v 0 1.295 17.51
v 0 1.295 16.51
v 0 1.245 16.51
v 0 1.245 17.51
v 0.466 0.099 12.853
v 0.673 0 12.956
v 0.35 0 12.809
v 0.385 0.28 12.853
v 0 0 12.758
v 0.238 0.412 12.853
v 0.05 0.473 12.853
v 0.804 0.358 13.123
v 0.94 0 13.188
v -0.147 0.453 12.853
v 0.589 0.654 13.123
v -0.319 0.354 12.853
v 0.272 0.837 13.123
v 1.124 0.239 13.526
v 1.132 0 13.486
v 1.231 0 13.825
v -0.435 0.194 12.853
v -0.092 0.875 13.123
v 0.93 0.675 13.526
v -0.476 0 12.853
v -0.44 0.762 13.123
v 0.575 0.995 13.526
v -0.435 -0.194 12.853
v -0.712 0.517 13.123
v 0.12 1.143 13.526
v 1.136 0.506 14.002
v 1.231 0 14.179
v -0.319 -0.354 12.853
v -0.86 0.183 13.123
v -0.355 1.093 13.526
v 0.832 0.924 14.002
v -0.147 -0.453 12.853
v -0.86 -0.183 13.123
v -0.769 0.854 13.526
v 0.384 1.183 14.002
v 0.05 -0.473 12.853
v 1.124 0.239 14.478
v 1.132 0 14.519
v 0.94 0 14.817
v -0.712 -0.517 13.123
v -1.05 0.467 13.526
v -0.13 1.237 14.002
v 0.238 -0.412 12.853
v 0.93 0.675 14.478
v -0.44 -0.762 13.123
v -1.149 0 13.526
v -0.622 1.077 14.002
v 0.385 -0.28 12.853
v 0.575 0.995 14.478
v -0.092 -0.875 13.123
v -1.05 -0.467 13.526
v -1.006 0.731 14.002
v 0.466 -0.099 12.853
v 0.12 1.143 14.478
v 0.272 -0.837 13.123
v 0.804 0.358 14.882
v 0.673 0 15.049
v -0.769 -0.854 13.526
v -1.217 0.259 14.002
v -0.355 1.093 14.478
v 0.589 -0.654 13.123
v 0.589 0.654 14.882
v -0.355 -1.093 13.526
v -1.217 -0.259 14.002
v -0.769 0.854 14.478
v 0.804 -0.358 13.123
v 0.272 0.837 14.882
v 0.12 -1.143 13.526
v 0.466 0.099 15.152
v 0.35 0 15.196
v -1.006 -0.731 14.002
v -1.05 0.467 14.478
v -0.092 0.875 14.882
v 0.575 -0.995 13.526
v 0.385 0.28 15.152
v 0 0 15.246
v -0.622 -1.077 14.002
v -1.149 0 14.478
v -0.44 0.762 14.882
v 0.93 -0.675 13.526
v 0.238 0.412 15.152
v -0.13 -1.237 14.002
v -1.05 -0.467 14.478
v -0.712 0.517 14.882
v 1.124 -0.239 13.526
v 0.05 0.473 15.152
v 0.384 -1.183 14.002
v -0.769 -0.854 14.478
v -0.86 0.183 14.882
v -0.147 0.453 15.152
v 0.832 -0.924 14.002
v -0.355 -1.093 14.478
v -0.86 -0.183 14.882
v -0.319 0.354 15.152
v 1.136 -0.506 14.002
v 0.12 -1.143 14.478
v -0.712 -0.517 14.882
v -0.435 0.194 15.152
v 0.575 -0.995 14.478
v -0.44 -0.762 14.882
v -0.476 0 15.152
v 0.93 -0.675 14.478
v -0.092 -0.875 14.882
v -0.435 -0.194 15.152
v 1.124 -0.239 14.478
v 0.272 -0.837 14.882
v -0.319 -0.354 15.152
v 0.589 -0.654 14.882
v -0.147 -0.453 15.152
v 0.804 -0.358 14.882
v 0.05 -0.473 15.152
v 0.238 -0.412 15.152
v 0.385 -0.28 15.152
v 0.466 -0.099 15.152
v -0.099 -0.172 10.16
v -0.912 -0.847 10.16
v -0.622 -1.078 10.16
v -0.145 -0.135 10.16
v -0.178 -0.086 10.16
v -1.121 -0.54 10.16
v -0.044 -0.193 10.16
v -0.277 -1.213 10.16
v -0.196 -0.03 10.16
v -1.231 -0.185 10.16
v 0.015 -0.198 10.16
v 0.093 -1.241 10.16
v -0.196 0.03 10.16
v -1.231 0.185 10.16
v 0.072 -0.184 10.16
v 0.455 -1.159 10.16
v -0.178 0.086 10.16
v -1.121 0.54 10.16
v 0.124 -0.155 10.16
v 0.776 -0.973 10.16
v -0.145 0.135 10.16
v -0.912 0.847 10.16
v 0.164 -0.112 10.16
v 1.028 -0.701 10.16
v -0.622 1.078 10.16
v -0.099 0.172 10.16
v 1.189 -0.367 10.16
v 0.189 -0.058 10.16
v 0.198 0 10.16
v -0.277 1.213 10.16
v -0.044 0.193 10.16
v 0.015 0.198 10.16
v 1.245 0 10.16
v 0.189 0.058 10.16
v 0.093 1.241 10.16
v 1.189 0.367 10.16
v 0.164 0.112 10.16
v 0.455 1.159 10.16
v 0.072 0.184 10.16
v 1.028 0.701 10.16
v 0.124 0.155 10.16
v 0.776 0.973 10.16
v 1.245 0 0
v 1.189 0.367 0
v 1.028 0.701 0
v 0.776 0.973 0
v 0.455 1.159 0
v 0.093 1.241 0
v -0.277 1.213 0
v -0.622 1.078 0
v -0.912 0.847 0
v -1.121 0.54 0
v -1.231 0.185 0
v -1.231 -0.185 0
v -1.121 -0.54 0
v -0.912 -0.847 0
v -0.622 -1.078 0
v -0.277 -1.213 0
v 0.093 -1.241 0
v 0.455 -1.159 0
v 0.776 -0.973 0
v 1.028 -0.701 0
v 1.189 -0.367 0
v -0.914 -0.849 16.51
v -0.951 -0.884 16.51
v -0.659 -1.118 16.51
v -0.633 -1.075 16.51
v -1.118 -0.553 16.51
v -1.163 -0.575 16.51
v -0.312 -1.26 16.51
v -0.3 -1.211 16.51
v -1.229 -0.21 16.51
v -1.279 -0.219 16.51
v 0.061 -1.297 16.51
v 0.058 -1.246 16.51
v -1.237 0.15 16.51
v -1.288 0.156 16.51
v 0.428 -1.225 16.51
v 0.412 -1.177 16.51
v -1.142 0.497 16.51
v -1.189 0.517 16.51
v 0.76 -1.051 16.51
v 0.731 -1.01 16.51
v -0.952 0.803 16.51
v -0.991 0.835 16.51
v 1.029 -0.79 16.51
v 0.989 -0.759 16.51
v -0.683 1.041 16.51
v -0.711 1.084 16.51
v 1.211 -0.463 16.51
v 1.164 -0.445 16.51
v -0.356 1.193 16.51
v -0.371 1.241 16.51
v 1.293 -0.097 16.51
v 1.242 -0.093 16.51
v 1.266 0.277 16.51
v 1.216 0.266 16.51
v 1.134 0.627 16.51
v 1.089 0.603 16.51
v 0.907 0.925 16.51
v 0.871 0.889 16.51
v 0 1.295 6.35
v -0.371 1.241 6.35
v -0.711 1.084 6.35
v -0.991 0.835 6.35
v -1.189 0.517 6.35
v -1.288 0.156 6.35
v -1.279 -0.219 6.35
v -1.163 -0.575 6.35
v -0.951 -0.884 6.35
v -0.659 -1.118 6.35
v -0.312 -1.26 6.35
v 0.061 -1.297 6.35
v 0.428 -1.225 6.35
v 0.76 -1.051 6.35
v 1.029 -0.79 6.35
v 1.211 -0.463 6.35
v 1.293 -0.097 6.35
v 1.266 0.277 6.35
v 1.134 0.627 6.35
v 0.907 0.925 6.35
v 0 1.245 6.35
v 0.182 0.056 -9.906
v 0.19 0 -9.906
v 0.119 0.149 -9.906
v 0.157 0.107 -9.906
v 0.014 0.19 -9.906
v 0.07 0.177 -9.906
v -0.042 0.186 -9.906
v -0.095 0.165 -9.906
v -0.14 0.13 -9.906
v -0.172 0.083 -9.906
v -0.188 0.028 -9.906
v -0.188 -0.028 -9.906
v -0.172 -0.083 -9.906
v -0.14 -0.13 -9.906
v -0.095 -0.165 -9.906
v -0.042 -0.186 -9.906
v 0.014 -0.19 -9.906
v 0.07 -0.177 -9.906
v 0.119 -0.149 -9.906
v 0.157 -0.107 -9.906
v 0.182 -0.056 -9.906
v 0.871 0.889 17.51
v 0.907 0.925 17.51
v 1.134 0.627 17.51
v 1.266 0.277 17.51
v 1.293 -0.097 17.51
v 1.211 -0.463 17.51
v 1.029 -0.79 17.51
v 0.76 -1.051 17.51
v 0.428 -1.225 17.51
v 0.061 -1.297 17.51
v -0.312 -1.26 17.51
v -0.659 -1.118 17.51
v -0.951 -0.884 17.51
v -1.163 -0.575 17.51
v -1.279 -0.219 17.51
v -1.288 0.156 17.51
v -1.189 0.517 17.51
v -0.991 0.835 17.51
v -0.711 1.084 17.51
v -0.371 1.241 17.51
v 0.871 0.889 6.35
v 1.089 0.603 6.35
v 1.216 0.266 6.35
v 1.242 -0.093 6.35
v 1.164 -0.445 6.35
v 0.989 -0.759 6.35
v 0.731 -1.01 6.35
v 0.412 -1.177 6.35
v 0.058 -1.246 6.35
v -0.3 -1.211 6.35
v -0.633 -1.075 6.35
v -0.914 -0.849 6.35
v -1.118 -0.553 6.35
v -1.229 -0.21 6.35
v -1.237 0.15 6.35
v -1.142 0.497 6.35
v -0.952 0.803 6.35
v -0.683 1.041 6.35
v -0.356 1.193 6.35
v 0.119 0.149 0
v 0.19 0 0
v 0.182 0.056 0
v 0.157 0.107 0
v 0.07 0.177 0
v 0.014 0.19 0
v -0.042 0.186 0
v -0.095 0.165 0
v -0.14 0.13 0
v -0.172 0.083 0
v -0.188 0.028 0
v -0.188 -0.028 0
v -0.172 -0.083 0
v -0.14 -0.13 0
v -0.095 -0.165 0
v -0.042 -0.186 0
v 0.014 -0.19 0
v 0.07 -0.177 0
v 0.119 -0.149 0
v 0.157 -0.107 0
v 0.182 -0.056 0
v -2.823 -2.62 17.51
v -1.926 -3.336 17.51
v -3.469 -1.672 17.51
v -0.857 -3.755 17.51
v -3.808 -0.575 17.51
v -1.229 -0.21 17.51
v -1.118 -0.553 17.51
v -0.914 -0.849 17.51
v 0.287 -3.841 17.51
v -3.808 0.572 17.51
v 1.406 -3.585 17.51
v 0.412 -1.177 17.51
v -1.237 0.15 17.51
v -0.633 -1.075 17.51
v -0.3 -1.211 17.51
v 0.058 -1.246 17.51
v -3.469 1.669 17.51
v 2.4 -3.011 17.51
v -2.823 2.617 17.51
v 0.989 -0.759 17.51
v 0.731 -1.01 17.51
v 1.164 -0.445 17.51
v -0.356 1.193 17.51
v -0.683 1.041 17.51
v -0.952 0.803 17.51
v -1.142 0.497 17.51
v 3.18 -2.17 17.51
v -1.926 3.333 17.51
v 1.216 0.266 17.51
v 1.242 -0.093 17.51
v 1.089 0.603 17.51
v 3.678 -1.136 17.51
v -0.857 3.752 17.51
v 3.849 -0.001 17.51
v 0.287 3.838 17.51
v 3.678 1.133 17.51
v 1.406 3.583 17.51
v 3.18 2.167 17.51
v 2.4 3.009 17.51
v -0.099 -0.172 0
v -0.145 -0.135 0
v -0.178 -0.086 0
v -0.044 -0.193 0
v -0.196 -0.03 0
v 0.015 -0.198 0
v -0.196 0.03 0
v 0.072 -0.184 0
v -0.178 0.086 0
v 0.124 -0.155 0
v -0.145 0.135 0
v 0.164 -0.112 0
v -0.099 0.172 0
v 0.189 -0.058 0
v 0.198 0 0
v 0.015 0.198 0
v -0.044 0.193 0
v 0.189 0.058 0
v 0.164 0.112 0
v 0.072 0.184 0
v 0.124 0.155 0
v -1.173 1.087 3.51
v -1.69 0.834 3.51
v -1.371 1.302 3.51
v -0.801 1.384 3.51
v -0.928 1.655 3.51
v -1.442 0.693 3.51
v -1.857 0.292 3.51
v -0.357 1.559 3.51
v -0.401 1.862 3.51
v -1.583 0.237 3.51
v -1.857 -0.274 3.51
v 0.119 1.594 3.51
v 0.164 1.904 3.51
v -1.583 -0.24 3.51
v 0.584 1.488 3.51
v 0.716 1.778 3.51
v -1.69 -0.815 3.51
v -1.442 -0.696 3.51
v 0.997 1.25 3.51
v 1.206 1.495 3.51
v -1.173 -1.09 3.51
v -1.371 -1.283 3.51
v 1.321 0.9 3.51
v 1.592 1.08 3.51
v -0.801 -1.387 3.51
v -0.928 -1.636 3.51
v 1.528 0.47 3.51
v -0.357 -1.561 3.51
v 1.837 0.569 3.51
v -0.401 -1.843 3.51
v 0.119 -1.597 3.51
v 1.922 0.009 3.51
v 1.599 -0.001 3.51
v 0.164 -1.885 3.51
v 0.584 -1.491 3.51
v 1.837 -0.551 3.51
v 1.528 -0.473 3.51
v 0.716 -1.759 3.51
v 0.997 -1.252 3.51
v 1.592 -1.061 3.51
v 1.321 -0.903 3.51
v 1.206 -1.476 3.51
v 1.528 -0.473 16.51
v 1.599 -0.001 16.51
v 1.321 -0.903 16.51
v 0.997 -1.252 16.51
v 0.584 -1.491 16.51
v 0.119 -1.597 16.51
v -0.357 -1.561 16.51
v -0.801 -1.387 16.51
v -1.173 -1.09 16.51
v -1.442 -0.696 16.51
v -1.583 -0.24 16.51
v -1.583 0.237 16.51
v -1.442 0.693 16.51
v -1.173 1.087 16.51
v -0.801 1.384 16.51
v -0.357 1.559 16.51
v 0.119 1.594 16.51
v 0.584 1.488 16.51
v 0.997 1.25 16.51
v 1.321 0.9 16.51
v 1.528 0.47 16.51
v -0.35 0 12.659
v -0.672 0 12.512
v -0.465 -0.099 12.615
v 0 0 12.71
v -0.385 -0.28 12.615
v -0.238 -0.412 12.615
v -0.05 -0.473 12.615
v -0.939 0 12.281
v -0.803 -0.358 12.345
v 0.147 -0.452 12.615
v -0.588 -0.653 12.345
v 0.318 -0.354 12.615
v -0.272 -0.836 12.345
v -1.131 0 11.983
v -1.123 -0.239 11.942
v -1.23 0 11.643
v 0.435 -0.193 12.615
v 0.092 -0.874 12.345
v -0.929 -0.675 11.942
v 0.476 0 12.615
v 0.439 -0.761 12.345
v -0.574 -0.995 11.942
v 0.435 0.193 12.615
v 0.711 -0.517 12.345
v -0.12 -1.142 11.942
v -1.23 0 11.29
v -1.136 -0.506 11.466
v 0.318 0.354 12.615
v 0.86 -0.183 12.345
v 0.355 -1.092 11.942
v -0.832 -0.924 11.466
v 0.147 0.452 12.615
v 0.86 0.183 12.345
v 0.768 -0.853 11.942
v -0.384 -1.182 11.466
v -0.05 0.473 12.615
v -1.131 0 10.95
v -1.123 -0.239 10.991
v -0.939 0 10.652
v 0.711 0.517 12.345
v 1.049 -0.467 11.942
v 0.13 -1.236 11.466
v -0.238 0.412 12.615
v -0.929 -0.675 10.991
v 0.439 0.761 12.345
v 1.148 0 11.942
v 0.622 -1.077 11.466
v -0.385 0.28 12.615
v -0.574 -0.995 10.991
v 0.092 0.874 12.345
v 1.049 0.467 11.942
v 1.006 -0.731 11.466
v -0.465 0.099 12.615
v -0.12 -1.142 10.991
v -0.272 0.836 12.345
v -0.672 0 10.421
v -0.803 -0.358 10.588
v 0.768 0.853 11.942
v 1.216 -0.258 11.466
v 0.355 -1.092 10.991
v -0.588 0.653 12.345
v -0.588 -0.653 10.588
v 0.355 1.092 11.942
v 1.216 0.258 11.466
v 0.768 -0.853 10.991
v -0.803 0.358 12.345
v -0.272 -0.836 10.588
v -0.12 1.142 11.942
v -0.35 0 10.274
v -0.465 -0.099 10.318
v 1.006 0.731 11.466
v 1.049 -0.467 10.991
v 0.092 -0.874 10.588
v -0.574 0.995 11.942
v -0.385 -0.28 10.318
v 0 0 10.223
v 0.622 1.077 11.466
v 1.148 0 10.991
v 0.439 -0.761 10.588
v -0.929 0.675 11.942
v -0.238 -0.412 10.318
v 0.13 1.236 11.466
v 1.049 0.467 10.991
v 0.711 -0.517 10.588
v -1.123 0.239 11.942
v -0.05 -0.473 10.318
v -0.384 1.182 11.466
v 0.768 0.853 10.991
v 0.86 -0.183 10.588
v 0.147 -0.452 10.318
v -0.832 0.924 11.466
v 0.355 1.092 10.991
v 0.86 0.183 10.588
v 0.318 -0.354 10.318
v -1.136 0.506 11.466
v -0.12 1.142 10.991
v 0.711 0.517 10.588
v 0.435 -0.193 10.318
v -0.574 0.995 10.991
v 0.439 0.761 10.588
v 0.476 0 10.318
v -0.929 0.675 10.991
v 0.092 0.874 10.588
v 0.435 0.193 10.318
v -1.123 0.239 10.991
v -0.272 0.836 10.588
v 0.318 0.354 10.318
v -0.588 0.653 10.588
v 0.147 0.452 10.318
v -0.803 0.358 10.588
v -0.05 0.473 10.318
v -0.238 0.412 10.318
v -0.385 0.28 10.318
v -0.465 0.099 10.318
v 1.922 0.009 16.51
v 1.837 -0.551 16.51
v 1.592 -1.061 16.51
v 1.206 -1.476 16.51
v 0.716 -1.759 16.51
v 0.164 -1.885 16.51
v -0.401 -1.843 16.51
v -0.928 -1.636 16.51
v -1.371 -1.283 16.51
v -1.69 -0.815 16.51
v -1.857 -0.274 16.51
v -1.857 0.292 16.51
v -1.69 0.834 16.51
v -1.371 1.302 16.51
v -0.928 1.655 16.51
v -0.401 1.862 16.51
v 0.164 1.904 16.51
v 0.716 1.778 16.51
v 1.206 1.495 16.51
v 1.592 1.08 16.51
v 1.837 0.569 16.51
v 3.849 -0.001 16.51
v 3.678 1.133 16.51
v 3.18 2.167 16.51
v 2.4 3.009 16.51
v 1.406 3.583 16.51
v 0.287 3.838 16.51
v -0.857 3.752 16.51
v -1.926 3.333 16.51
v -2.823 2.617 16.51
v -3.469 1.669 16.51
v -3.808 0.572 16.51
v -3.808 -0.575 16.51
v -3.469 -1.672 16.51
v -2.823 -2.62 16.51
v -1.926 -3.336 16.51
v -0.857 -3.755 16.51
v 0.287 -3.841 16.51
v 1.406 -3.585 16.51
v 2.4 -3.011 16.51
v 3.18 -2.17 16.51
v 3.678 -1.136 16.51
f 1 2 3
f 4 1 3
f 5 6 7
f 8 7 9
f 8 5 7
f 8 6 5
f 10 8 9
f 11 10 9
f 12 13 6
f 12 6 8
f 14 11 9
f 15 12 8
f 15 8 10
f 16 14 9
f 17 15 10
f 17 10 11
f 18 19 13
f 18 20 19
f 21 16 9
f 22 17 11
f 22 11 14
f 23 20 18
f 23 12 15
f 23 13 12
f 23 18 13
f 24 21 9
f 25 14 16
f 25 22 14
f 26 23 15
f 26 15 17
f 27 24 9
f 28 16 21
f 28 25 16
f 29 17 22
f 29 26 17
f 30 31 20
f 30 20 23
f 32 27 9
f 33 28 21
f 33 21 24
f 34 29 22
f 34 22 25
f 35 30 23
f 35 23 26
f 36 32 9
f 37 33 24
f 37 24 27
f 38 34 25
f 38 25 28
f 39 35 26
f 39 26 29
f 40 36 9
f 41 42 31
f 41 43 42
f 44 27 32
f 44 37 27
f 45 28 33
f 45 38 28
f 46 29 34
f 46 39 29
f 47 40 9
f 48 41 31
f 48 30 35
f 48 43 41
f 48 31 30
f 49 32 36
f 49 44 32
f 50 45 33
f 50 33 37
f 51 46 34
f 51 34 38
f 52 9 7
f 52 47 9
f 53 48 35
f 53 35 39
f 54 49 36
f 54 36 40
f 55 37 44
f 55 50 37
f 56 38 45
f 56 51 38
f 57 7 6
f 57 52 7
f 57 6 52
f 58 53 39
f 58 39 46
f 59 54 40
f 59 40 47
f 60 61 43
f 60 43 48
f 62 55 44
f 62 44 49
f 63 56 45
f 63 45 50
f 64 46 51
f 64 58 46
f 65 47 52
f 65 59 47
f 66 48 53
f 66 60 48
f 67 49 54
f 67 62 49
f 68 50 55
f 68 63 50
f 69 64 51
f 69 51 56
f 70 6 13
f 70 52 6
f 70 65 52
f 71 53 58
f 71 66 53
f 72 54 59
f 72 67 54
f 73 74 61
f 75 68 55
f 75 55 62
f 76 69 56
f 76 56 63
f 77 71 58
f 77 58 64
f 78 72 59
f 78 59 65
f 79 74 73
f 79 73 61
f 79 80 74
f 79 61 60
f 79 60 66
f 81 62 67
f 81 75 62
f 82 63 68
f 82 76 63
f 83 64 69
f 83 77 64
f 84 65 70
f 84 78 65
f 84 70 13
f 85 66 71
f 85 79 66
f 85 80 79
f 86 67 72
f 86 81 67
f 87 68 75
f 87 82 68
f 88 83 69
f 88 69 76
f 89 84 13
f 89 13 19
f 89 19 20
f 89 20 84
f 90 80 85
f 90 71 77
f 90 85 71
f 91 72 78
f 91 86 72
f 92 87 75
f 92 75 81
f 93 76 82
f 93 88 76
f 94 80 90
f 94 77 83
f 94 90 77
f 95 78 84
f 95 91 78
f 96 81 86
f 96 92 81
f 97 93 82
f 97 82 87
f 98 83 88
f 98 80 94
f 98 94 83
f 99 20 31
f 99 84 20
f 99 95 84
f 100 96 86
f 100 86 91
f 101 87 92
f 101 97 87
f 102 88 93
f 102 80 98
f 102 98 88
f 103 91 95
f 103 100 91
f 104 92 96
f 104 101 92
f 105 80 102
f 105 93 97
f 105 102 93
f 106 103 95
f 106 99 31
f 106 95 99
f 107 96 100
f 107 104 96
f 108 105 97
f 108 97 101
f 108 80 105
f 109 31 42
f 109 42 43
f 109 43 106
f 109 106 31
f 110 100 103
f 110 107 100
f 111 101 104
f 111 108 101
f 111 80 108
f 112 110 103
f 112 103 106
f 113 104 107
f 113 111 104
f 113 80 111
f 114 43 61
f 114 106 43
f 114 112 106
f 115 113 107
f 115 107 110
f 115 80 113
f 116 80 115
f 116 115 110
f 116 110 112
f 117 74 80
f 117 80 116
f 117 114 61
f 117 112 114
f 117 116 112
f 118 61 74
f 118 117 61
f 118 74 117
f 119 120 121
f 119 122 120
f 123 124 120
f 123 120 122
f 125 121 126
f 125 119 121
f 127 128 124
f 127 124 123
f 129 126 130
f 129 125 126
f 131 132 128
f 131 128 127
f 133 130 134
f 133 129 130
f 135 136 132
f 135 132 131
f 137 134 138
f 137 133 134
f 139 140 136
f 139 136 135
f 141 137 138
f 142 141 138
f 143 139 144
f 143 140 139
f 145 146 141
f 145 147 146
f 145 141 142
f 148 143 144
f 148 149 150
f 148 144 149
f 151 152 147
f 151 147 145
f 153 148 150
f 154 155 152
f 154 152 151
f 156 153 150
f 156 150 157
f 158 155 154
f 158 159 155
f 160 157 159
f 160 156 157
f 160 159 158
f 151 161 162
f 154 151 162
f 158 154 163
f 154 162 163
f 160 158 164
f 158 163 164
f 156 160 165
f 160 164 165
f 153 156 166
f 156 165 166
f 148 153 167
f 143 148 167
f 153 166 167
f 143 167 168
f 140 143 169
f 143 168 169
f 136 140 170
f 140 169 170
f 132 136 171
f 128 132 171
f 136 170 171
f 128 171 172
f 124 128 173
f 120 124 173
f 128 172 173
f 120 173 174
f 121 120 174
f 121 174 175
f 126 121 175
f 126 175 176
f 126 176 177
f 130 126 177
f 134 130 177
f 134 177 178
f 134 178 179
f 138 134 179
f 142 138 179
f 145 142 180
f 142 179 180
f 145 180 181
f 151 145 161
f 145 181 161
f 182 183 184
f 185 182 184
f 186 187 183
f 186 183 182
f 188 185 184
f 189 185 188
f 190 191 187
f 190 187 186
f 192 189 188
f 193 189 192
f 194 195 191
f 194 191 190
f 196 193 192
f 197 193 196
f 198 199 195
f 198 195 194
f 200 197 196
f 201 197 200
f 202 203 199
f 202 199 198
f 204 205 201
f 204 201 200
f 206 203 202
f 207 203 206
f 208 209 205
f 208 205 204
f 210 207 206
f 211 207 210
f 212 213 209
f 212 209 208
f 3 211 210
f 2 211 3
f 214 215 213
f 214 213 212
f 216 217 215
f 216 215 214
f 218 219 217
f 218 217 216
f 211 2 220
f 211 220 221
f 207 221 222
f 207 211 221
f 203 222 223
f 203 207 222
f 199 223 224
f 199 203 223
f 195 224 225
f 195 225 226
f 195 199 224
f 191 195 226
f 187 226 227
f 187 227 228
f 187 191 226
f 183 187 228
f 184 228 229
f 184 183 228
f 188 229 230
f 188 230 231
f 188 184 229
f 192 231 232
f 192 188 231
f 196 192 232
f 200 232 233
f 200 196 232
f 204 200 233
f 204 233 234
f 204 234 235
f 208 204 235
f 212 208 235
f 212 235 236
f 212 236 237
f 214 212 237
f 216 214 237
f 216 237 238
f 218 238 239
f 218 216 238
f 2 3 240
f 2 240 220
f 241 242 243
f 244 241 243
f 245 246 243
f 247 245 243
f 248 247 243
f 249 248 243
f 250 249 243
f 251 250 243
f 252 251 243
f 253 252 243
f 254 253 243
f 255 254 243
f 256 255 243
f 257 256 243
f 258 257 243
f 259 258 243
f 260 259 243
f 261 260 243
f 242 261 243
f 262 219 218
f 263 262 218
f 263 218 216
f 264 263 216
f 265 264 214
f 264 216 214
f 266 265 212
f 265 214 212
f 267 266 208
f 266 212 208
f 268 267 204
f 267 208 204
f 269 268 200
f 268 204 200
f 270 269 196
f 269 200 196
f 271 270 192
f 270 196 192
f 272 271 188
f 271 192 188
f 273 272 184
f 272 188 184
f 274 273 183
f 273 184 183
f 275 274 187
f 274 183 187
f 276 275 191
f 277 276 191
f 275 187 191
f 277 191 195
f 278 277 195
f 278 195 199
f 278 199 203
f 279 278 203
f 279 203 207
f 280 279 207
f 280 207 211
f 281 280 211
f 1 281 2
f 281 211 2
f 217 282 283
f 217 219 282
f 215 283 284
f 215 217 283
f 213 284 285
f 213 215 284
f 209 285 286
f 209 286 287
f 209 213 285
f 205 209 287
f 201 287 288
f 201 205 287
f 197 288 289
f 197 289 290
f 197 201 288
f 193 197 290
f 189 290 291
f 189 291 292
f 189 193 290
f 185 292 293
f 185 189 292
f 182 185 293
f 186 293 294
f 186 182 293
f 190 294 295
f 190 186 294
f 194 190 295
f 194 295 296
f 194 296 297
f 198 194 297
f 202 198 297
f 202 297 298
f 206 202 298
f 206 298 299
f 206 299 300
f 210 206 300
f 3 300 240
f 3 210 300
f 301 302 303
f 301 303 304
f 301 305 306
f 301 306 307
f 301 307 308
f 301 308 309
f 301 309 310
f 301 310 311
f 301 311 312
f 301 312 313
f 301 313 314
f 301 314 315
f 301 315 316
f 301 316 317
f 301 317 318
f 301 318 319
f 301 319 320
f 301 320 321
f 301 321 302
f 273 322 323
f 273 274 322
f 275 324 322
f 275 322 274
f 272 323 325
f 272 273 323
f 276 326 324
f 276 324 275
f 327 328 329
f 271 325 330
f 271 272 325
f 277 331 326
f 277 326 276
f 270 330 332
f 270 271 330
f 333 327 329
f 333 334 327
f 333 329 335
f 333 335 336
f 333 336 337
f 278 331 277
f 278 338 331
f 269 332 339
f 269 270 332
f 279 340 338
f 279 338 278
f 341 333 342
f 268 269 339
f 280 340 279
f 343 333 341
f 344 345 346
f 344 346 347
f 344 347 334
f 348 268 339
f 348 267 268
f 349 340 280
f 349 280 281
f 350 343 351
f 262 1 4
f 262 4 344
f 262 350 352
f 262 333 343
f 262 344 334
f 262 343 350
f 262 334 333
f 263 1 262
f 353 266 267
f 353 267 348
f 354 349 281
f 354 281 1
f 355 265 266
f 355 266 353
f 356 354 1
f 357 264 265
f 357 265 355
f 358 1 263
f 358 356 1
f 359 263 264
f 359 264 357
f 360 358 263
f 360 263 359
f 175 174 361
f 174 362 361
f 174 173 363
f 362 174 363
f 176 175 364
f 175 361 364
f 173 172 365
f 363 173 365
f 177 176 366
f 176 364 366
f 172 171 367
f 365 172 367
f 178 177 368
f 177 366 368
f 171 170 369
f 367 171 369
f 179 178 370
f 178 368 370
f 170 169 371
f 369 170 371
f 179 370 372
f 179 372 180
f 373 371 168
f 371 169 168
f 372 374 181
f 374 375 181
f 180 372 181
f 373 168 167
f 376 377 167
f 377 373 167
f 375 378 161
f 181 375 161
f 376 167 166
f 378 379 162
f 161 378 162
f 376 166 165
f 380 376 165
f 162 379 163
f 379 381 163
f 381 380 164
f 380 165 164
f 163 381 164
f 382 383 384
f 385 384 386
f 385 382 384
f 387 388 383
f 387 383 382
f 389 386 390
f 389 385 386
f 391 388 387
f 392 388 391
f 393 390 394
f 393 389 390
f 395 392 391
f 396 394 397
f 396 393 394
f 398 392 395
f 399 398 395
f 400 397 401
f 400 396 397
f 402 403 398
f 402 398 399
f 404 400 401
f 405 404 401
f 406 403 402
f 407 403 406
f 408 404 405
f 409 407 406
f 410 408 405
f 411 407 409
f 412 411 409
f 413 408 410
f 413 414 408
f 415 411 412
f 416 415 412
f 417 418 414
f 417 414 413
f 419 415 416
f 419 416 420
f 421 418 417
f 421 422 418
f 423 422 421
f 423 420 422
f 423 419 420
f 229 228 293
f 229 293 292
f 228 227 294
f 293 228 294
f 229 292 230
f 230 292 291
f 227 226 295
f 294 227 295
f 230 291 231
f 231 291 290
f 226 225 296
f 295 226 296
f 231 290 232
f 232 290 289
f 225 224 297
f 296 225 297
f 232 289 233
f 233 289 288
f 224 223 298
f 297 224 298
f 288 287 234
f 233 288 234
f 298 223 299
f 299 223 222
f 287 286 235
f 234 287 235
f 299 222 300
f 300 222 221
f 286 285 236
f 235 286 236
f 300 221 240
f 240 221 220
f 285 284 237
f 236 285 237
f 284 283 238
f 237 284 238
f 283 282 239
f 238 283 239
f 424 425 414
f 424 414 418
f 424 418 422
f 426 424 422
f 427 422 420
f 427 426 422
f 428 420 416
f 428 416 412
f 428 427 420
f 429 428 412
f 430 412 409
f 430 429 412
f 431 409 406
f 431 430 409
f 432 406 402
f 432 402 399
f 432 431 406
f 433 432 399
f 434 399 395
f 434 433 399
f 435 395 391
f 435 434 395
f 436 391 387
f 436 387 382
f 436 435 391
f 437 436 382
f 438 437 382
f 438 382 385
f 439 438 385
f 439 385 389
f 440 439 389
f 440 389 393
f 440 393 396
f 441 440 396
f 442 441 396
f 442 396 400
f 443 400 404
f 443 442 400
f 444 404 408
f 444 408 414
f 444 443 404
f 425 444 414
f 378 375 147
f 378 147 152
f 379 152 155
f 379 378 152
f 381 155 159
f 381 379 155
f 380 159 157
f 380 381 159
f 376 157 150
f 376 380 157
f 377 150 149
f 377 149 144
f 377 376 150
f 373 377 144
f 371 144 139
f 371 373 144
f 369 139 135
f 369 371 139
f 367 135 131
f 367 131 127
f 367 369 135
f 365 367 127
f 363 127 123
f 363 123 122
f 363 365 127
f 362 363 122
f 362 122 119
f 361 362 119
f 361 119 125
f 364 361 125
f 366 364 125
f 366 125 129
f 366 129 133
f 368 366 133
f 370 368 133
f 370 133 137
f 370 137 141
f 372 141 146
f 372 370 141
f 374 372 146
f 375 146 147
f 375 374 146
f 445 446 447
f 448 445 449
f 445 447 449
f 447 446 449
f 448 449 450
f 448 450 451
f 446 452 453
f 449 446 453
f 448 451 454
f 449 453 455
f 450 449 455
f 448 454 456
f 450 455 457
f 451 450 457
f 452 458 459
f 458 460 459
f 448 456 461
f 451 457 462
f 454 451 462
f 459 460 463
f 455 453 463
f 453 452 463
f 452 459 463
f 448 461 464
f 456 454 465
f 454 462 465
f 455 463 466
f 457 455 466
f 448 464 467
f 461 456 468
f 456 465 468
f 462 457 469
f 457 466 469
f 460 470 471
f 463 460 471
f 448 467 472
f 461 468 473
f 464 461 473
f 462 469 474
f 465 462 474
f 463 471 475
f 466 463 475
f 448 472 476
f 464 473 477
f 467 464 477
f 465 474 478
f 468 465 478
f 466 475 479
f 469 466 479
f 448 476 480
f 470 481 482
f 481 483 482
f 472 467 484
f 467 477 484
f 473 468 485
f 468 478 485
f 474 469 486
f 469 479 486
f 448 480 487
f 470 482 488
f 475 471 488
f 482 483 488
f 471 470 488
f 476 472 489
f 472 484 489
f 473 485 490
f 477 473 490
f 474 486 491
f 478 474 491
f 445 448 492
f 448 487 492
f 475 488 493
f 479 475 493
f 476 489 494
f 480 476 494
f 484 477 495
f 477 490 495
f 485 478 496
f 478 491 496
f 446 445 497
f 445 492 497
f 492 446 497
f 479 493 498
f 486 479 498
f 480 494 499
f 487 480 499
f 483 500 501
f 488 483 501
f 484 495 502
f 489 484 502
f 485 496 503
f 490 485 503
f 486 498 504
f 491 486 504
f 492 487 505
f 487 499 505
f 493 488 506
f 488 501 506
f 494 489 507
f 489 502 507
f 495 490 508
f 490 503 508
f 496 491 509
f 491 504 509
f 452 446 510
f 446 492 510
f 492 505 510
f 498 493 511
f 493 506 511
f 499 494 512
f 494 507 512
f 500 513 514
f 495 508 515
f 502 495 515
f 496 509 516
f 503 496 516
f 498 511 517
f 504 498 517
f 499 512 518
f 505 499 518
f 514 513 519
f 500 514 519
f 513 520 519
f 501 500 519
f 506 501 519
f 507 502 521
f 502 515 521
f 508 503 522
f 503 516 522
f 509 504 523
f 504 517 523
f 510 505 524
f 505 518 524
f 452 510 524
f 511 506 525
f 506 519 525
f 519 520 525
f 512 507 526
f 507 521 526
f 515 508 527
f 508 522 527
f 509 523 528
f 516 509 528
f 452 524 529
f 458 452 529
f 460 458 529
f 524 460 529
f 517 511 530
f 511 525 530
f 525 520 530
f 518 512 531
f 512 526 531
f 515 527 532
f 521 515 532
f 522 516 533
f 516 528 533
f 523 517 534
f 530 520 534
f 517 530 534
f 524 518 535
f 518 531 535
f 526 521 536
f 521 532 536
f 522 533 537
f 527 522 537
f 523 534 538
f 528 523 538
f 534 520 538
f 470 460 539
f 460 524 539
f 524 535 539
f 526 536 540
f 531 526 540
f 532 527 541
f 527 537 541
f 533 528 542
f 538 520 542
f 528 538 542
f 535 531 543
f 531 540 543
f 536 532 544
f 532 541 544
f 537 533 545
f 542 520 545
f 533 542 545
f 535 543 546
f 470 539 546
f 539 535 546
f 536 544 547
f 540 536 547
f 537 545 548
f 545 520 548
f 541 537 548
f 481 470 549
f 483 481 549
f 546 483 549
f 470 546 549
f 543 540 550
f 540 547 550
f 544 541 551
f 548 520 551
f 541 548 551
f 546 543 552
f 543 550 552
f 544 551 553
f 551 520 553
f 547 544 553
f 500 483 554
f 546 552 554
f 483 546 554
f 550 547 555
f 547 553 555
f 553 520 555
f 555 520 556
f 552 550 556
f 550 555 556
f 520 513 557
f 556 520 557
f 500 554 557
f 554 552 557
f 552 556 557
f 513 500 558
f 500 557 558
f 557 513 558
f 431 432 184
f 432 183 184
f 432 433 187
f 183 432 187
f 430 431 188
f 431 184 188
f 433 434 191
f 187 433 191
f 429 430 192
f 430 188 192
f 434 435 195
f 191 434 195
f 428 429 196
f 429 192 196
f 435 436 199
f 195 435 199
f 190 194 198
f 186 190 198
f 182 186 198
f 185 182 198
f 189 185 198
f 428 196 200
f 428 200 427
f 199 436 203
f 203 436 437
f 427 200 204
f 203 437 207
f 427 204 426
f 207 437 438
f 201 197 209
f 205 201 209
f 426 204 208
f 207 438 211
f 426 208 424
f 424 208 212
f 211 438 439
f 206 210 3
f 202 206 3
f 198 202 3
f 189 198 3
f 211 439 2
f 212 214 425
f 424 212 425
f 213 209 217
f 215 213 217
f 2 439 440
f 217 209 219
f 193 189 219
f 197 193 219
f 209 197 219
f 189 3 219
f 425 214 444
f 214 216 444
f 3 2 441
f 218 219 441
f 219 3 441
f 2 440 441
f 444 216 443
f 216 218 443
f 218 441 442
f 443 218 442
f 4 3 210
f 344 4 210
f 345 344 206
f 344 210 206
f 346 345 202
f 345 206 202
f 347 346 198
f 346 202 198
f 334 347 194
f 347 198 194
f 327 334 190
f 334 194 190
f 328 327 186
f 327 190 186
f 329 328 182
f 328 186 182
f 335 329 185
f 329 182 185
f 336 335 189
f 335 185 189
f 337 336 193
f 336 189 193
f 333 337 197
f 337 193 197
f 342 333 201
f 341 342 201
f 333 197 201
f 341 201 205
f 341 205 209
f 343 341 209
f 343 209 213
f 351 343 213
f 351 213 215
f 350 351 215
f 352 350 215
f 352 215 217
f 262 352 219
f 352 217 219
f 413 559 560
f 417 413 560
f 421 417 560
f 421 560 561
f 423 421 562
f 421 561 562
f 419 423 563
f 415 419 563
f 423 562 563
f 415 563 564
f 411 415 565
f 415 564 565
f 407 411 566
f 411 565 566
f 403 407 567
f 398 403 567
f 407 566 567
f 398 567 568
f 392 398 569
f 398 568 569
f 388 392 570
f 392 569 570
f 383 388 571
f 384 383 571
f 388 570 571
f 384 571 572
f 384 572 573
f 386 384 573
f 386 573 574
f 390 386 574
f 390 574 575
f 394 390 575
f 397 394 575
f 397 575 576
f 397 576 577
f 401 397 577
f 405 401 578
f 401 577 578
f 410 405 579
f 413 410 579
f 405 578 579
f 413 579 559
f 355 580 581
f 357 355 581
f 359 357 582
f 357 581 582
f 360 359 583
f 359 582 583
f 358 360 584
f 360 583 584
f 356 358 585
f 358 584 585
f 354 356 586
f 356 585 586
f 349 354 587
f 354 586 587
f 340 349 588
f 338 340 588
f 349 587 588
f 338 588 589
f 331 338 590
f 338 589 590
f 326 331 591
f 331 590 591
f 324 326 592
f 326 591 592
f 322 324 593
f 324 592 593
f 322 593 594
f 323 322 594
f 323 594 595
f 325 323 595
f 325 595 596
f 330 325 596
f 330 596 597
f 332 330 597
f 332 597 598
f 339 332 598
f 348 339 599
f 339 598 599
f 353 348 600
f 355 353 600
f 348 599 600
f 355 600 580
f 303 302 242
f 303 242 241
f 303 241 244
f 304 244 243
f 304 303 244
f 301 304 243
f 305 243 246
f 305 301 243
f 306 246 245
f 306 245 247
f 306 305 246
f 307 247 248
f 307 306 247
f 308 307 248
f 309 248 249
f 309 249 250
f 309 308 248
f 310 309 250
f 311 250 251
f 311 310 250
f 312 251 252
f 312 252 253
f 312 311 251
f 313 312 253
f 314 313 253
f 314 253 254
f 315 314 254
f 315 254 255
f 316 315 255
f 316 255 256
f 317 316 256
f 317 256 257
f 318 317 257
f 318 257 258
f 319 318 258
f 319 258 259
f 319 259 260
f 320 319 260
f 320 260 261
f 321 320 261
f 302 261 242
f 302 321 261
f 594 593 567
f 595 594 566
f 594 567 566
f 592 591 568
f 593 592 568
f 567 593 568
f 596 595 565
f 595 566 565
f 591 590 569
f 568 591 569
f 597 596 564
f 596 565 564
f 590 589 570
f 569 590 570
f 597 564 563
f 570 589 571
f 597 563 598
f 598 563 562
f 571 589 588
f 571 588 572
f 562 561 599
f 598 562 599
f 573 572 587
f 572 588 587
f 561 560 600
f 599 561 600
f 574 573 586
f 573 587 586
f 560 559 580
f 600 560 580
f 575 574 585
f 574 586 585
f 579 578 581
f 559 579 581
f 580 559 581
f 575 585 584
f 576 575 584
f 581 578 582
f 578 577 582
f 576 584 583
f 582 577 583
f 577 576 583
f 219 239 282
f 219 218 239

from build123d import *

# Parameters (mm, degrees)
F0_R          = 1.2446
F0_R_2        = 0.19812
F1_DEPTH      = 10.16
F2_R          = 0.1905
F3_DEPTH      = 9.906
F5_DEPTH      = 6.35
F5_DEPTH_BACK = 3.81
F10_R         = 3.85
F11_DEPTH     = 1
F13_R         = 1.9
F13_R_2       = 1.6
F14_DEPTH     = 13


with BuildPart() as f1:
    # F0 (on Top) → F1 (new body)
    with BuildSketch(Plane.XY):
        Circle(F0_R)
        Circle(F0_R_2, mode=Mode.SUBTRACT)
    extrude(amount=F1_DEPTH)


with BuildPart() as f3:
    # F2 (on Top) → F3 (new body)
    with BuildSketch(Plane.XY):
        Circle(F2_R)
    extrude(amount=-F3_DEPTH)


with BuildPart() as f5:
    # F4 (on face) → F5 (new body, two sides)
    with BuildSketch(Plane.XY.offset(10.16)) as f5_sk:
        with BuildLine():
            ThreePointArc((0.871144, 0.888897), (-0.471549, -1.15486), (0, 1.2446))
            Line((0, 1.2446), (2.3e-05, 1.2954))
            ThreePointArc((2.3e-05, 1.2954), (-0.490753, -1.20189), (0.906685, 0.925194))
            Line((0.906685, 0.925194), (0.871144, 0.888897))
        make_face()
    extrude(amount=F5_DEPTH)
    extrude(f5_sk.sketch, amount=-F5_DEPTH_BACK)


with BuildPart() as f7:
    # F6 (on Front) → F7 (revolve)
    with BuildSketch(Plane.XZ):
        with BuildLine():
            ThreePointArc((0, 12.709577), (-1.243077, 11.4665), (0, 10.223423))
            Line((0, 10.223423), (0, 12.709577))
        make_face()
    revolve(axis=Axis((0, 0, 11.4665), (0, 0, 1)))


with BuildPart() as f9:
    # F8 (on Front) → F9 (revolve)
    with BuildSketch(Plane.XZ):
        with BuildLine():
            Line((0, 15.246193), (0, 12.758371))
            ThreePointArc((0, 12.758371), (1.243911, 14.002282), (0, 15.246193))
        make_face()
    revolve(axis=Axis((0, 0, 14.002282), (0, 0, 1)))


with BuildPart() as f11:
    # F10 (on face) → F11 (new body)
    with BuildSketch(Plane.XY.offset(16.51)):
        with Locations((-0.000554, -0.001356)):
            Circle(F10_R)
        with BuildLine():
            ThreePointArc((0, 1.2446), (-0.471549, -1.15486), (0.871144, 0.888897))
            Line((0.871144, 0.888897), (0.906685, 0.925194))
            ThreePointArc((0.906685, 0.925194), (-0.490753, -1.20189), (2.3e-05, 1.2954))
            Line((2.3e-05, 1.2954), (0, 1.2446))
        make_face(mode=Mode.SUBTRACT)
    extrude(amount=F11_DEPTH)

    # F13 (on face) → F14 (join)
    with BuildSketch(Plane(origin=(0, 0, 16.51), x_dir=(1, 0, 0), z_dir=(0, 0, -1))):
        with Locations((0.021651, -0.009226)):
            Circle(F13_R)
        with Locations((-0.000554, 0.001356)):
            Circle(F13_R_2, mode=Mode.SUBTRACT)
    extrude(amount=F14_DEPTH)


solid = Compound([f1.part, f3.part, f5.part, f7.part, f9.part, f11.part])
